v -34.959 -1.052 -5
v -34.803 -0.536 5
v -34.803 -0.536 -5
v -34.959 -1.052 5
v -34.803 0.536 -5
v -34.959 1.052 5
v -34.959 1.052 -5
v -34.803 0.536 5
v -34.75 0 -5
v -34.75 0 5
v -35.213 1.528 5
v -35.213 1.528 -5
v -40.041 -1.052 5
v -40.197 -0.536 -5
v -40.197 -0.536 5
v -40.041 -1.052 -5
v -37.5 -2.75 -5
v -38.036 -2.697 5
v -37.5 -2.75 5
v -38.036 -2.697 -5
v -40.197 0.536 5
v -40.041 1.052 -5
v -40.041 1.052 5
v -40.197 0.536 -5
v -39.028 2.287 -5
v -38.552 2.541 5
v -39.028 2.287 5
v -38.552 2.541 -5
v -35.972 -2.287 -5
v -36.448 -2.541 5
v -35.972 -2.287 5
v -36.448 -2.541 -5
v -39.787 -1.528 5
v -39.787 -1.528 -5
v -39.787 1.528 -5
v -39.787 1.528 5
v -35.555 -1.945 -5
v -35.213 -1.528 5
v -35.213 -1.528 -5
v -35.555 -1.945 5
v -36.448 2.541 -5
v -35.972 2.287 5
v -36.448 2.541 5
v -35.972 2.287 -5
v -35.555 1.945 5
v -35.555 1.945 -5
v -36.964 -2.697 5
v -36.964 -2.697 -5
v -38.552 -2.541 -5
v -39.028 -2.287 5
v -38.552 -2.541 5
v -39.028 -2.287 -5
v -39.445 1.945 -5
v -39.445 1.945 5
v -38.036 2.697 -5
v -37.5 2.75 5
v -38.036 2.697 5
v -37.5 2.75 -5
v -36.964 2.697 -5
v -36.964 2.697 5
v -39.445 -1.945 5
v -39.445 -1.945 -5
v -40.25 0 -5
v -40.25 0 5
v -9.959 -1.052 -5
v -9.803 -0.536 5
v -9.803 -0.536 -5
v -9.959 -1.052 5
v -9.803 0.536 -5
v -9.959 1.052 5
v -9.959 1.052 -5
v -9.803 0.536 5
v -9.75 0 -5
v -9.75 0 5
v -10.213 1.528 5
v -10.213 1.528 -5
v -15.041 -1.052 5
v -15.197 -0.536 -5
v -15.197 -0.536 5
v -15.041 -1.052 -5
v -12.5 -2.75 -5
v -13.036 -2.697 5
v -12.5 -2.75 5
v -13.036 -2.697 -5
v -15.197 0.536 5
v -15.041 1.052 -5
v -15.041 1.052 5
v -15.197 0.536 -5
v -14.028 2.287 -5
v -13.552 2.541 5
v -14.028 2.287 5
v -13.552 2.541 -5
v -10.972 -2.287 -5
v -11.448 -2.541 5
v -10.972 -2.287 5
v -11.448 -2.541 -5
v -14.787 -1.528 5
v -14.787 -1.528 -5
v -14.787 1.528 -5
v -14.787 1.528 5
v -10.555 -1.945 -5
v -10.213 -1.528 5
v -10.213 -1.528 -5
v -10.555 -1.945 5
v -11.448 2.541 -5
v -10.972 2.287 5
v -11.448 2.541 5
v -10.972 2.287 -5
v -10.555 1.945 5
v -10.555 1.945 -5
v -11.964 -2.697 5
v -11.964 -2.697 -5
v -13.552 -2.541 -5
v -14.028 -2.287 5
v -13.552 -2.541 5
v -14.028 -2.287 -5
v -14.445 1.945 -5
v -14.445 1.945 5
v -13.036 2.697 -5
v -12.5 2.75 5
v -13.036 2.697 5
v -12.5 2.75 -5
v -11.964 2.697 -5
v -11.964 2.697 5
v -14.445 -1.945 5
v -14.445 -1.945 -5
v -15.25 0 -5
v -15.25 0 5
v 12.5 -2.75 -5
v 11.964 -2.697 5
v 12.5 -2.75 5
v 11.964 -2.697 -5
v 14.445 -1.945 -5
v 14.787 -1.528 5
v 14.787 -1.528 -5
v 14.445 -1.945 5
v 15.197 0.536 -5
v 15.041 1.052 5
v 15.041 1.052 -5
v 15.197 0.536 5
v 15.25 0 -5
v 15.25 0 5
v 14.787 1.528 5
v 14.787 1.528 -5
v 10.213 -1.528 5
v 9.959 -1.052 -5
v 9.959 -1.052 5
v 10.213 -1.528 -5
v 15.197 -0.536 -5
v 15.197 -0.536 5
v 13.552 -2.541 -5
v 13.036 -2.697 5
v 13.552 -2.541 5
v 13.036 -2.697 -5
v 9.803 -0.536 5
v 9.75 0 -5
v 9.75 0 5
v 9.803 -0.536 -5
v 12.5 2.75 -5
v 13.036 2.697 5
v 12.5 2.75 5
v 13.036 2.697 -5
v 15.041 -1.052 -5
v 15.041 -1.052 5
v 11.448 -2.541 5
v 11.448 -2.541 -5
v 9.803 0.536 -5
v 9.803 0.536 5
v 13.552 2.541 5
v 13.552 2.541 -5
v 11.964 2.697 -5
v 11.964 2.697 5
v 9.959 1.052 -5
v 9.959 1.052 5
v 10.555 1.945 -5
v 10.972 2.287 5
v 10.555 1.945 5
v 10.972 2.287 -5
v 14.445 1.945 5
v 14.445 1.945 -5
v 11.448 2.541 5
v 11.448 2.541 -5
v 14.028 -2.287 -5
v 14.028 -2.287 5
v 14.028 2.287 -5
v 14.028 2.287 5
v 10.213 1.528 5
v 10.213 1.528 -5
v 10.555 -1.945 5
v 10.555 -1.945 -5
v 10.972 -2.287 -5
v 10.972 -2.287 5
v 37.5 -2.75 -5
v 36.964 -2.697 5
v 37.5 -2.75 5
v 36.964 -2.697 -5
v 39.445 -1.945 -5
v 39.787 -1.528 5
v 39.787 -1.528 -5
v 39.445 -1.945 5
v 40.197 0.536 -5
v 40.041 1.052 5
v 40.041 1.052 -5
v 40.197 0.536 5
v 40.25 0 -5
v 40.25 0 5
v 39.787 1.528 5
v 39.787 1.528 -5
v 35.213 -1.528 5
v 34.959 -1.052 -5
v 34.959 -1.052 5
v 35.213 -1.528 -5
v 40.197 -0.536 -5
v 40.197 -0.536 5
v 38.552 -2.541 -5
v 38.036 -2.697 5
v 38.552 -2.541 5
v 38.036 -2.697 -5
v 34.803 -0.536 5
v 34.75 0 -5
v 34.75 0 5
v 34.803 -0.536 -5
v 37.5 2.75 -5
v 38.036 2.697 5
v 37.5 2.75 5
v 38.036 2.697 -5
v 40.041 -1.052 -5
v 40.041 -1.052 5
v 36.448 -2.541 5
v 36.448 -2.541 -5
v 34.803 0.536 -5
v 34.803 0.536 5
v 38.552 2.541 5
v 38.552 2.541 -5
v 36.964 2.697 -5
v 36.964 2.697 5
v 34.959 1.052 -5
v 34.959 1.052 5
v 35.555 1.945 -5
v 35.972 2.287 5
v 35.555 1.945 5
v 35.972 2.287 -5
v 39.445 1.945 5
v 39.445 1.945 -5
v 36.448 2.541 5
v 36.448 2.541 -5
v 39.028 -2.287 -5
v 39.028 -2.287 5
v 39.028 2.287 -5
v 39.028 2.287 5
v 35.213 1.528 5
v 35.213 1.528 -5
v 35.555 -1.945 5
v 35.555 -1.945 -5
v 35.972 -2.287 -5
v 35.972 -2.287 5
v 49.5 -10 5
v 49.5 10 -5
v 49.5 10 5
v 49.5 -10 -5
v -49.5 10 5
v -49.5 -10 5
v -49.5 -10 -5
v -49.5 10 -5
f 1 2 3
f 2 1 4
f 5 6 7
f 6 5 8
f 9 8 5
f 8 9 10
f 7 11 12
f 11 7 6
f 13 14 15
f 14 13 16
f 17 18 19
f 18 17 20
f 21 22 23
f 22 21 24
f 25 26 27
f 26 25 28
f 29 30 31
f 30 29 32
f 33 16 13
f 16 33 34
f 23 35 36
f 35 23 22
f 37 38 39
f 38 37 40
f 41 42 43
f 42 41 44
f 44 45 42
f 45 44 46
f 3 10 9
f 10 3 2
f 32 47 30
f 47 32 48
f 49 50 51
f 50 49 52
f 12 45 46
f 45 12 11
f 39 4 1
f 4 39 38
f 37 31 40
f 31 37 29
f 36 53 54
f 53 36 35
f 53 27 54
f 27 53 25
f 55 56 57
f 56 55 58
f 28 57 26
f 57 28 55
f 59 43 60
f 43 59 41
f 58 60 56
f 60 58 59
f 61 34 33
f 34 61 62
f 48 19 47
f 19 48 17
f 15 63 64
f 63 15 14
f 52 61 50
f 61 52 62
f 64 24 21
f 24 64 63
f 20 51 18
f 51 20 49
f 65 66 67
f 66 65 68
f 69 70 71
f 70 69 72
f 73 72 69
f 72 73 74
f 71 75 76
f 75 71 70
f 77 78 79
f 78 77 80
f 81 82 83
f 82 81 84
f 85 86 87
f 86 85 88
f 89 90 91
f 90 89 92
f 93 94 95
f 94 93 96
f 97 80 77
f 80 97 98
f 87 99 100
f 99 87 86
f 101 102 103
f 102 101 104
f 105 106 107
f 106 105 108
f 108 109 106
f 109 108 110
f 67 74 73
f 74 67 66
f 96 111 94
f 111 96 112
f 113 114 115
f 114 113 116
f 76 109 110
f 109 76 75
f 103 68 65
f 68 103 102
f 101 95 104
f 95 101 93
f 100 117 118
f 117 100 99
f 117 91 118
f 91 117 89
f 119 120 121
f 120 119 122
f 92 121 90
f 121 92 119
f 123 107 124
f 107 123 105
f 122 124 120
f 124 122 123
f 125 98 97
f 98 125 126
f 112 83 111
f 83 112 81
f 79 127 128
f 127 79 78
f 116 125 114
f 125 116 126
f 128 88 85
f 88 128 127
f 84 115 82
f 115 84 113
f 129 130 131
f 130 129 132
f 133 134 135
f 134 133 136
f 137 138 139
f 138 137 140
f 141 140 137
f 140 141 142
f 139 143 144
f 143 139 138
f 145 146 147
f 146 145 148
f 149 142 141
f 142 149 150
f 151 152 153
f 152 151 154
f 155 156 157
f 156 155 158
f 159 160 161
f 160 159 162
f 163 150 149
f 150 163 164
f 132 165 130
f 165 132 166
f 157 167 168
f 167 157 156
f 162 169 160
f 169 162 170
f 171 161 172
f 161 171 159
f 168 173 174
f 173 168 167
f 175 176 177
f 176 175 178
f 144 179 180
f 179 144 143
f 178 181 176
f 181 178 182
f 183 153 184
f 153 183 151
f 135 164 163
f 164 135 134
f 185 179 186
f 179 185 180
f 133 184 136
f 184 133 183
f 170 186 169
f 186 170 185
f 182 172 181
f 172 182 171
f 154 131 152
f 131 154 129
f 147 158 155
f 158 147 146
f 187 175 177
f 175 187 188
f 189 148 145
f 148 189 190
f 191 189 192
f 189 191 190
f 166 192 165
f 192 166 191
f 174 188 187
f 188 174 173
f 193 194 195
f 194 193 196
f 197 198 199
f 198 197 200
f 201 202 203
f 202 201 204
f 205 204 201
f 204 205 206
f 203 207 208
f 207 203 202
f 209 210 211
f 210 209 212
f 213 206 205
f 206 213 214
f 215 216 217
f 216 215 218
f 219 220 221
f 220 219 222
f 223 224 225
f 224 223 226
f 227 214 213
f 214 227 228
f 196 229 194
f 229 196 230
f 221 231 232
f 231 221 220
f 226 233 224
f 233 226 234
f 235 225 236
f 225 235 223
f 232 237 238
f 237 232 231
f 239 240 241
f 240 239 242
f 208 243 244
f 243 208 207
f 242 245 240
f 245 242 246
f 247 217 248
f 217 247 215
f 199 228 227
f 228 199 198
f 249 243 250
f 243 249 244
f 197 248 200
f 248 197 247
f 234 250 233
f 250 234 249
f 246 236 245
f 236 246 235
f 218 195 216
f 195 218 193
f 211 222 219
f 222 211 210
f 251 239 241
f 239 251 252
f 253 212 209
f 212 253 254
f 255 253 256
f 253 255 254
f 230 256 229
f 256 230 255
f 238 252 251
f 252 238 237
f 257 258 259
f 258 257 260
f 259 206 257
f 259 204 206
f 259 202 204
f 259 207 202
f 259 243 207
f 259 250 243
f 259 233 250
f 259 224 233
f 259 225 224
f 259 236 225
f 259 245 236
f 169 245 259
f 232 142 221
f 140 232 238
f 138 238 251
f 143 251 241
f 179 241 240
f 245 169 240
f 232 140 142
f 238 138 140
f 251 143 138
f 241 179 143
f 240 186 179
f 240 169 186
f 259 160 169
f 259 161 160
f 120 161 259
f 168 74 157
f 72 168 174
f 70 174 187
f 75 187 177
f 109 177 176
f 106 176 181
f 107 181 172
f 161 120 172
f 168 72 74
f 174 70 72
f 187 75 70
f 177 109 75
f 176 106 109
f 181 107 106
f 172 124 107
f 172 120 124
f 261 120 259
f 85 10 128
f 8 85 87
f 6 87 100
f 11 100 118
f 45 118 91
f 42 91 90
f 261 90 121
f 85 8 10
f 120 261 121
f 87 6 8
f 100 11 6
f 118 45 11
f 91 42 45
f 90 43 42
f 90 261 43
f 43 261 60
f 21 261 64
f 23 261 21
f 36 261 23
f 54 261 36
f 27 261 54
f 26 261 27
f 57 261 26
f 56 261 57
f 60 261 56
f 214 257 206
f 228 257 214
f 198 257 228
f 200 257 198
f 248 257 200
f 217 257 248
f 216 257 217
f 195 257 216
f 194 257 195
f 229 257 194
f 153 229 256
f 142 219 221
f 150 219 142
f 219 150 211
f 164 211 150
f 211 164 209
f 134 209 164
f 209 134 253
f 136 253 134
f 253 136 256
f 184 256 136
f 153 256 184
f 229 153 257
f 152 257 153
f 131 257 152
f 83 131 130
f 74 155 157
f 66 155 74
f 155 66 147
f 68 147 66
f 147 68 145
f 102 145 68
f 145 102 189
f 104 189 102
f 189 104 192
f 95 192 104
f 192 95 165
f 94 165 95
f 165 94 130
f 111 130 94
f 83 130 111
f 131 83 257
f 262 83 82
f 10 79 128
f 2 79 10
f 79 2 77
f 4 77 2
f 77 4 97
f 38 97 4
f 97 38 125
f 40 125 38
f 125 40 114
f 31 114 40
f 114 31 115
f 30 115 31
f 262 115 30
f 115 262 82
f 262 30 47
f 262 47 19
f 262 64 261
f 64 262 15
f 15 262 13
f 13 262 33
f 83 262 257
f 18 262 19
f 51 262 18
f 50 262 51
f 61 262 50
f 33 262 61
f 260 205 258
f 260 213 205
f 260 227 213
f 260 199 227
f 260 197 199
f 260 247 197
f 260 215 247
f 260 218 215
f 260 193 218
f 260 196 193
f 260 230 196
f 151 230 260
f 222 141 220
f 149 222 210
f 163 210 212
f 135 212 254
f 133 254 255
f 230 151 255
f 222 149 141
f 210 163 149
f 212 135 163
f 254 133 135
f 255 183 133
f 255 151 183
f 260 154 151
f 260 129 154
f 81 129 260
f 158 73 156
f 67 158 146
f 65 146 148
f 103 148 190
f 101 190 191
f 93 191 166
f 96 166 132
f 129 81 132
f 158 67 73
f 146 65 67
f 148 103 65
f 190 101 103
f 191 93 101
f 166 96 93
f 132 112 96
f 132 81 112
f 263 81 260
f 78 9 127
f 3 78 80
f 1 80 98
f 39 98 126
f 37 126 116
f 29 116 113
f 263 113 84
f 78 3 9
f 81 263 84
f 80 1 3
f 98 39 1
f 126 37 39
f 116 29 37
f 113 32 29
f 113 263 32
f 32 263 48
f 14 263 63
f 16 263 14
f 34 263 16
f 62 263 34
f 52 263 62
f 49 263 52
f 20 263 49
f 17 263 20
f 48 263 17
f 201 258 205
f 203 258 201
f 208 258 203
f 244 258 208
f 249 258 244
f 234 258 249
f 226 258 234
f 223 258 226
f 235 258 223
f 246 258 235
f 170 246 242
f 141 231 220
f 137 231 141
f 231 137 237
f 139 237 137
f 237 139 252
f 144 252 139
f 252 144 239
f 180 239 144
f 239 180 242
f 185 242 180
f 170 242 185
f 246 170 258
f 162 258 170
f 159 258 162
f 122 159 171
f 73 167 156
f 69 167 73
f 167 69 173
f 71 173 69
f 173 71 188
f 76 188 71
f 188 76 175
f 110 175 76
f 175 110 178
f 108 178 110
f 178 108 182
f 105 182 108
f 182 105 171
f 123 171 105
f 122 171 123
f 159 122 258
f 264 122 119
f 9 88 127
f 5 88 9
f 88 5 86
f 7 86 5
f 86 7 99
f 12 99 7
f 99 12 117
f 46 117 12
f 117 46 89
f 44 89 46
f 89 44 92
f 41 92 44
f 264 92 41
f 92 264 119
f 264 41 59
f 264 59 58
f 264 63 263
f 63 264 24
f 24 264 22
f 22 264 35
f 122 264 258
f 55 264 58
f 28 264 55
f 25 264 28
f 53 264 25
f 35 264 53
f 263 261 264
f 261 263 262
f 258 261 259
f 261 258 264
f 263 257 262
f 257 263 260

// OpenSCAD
$fn = 32;

// ----------------------------------------------------------------------
// Hole bar, 4 x Ø5.5
// skip layout, 12 mm edge offset
// ----------------------------------------------------------------------

// --- parameters (mm) ---
bar_w = 20;         // bar width (Y)
bar_t = 10;         // bar thickness (Z)
holes = 4;          // holes per row
hole_d = 5.5;       // hole diameter
edge = 12;          // offset from the bar end to the first hole
grid_pitch = 12.5;  // grid the bar was laid out on

// --- derived feature positions (mm) ---
pitch = grid_pitch * 2;       // = 25   holes sit every other grid slot
span = (holes - 1) * pitch;   // = 75   distance between the end holes
bar_l = span + 2 * edge;      // = 99   overall bar length
start_x = -bar_l / 2 + edge;  // = -37.5   X of the first hole
feature_centers = [
  [start_x + 0 * pitch, 0],
  [start_x + 1 * pitch, 0],
  [start_x + 2 * pitch, 0],
  [start_x + 3 * pitch, 0]
];   // hole centres of the first row

// bar with one row of holes, drilled from feature_centers
difference() {
  translate([-bar_l / 2, -bar_w / 2, -bar_t / 2]) cube([bar_l, bar_w, bar_t]);
  for (centre = feature_centers)
    translate([centre[0], centre[1], 0])
      cylinder(d = hole_d, h = bar_t + 2, center = true);
}
